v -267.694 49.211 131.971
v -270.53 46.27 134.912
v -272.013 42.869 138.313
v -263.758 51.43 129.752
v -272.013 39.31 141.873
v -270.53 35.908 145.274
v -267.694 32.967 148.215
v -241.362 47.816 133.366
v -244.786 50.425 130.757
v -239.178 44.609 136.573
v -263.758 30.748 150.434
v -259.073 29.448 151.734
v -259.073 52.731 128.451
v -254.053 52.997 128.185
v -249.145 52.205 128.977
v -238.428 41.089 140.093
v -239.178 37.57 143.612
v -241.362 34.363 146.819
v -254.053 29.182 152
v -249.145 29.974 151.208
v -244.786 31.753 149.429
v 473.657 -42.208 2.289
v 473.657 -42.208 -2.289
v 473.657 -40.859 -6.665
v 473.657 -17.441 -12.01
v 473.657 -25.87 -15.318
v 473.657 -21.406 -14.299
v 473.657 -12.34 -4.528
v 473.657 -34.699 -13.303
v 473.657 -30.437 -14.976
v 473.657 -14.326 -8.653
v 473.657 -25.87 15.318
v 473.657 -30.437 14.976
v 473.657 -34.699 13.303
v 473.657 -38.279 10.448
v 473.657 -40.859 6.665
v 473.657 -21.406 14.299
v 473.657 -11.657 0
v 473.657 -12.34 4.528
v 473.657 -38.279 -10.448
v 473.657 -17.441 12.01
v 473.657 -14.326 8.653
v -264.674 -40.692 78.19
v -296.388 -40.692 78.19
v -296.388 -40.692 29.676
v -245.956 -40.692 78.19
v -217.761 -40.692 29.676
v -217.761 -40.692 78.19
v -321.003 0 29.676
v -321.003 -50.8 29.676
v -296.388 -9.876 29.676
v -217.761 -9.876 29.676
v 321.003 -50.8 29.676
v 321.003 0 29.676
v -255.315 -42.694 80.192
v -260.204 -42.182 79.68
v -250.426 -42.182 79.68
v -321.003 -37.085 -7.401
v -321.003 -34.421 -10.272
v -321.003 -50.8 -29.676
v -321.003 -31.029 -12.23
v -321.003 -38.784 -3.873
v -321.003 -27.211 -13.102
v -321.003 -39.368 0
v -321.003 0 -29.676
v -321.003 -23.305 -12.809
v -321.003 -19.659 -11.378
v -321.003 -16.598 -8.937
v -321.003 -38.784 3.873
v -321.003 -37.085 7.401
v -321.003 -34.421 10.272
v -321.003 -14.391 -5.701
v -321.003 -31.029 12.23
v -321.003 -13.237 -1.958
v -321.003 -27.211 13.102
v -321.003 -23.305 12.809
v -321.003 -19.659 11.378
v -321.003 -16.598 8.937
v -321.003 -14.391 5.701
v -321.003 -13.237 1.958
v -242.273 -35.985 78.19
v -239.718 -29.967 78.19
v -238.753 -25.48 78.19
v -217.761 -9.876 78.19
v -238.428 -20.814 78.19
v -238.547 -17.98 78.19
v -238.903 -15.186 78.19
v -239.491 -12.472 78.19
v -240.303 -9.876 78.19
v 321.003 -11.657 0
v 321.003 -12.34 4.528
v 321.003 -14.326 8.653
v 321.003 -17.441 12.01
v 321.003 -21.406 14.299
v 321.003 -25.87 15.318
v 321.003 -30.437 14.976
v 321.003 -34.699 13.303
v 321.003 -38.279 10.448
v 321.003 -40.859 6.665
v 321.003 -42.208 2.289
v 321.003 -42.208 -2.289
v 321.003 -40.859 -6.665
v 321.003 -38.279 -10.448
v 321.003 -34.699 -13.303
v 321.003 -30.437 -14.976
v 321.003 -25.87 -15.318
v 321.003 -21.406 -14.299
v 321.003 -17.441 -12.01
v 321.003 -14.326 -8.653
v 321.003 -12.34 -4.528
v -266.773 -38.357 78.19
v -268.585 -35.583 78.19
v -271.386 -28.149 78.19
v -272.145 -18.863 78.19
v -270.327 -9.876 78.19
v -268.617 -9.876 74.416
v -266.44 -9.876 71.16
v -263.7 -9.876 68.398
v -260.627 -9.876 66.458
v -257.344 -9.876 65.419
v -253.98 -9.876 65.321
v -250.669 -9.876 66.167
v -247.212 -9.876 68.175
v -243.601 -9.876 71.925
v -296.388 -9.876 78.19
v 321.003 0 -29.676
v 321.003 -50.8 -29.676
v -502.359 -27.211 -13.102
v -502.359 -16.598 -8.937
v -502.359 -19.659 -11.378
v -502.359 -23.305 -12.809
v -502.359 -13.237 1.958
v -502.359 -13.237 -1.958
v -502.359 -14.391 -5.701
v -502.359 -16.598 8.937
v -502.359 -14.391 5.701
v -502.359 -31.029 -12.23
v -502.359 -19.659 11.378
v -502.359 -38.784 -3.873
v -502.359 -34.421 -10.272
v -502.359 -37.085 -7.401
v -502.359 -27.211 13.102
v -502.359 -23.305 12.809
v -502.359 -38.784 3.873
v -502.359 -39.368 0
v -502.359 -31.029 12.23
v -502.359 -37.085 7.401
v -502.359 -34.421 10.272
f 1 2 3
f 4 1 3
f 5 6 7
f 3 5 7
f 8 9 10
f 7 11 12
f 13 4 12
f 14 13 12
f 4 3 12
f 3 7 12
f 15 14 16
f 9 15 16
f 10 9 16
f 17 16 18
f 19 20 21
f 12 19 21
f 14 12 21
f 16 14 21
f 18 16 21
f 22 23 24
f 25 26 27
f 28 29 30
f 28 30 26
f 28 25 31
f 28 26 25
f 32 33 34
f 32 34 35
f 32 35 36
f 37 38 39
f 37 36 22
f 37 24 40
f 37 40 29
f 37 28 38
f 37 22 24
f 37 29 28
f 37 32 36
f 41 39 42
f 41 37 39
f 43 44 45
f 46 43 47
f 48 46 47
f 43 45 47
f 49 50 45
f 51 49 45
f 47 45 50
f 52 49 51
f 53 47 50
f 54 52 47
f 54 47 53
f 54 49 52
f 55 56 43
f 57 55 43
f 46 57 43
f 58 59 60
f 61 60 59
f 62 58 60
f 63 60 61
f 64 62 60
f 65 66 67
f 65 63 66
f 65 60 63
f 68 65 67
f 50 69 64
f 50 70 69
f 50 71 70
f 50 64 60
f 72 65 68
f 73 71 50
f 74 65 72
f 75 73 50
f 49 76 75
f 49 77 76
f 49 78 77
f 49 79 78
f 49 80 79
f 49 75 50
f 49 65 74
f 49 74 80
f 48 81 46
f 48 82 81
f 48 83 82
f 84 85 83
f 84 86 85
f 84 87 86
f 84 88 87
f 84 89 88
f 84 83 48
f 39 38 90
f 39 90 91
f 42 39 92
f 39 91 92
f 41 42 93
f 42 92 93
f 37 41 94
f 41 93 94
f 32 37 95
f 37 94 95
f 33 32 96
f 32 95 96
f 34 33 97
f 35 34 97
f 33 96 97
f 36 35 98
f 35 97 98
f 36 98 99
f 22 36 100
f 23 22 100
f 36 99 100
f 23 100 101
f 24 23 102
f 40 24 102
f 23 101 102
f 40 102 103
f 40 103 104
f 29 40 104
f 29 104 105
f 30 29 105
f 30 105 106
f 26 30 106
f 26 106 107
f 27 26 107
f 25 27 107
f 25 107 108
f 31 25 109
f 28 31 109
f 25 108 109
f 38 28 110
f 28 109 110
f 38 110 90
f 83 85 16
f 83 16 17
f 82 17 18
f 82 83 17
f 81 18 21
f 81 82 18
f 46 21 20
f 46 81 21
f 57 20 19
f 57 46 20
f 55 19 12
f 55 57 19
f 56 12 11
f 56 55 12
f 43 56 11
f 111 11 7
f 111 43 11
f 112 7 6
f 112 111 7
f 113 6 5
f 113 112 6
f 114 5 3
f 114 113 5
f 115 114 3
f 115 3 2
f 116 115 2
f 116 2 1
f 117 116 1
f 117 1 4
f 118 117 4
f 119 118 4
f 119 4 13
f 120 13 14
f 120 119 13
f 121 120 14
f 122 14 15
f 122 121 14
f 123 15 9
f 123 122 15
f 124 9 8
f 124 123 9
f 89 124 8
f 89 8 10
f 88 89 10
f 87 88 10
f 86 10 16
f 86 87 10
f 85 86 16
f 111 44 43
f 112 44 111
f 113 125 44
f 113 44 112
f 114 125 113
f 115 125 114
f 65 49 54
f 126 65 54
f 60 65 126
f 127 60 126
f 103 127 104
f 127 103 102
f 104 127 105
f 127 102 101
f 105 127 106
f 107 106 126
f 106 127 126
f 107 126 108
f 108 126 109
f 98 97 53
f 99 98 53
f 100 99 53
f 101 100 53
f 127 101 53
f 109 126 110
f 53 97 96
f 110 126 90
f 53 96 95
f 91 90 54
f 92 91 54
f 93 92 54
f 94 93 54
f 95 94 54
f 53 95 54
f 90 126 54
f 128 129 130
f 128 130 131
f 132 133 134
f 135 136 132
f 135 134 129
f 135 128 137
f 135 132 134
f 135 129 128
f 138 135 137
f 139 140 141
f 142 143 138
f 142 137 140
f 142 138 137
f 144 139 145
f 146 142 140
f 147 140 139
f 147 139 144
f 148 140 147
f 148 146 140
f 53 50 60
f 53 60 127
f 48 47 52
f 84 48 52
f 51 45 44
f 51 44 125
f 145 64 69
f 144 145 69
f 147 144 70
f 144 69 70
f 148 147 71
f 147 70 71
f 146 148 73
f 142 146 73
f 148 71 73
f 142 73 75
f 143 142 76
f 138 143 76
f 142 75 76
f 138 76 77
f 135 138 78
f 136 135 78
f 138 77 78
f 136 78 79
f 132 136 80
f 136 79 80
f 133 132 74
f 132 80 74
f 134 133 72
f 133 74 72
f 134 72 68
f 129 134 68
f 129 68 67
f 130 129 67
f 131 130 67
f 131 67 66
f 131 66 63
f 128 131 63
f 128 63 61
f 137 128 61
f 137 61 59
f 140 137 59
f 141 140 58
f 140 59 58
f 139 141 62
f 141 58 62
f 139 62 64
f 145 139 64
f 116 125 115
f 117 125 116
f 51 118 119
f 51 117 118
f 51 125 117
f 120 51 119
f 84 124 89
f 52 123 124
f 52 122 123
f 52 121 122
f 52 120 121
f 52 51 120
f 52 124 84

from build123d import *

# Parameters (mm, degrees)
F0_W      = 642.00504
F0_H      = 59.35203
F1_DEPTH  = 50.8
F2_R      = 13.138682
F3_DEPTH  = 181.356
F4_R      = 15.361359
F5_DEPTH  = 152.654
F6_W      = 78.62696
F6_H      = 30.816156
F7_DEPTH  = 48.514
F9_R      = 16.886995
F10_DEPTH = 101.6


with BuildPart() as f1:
    # F0 (on Front) → F1 (new body)
    with BuildSketch(Plane.XZ):
        Rectangle(F0_W, F0_H)
    extrude(amount=F1_DEPTH)

    # F2 (on face) → F3 (join)
    with BuildSketch(Plane(origin=(-321.00252, 0, 0), x_dir=(0, -1, 0), z_dir=(-1, 0, 0))):
        with Locations((26.228841, 0)):
            Circle(F2_R)
    extrude(amount=F3_DEPTH)

    # F4 (on face) → F5 (join)
    with BuildSketch(Plane.YZ.offset(321.00252)):
        with Locations((-27.018422, 0)):
            Circle(F4_R)
    extrude(amount=F5_DEPTH)

    # F6 (on face) → F7 (join)
    with BuildSketch(Plane.XY.offset(29.676015)):
        with Locations((-257.074803, -25.283979)):
            Rectangle(F6_W, F6_H)
    extrude(amount=F7_DEPTH)

    # F9 (on face) → F10 (join)
    with BuildSketch(Plane(origin=(0, 18.748979, 18.748979), x_dir=(1, 0, 0), z_dir=(0, -0.707107, -0.707107))):
        with Locations((-255.314887, 70.006117)):
            Circle(F9_R)
    extrude(amount=-F10_DEPTH)


solid = f1.part
